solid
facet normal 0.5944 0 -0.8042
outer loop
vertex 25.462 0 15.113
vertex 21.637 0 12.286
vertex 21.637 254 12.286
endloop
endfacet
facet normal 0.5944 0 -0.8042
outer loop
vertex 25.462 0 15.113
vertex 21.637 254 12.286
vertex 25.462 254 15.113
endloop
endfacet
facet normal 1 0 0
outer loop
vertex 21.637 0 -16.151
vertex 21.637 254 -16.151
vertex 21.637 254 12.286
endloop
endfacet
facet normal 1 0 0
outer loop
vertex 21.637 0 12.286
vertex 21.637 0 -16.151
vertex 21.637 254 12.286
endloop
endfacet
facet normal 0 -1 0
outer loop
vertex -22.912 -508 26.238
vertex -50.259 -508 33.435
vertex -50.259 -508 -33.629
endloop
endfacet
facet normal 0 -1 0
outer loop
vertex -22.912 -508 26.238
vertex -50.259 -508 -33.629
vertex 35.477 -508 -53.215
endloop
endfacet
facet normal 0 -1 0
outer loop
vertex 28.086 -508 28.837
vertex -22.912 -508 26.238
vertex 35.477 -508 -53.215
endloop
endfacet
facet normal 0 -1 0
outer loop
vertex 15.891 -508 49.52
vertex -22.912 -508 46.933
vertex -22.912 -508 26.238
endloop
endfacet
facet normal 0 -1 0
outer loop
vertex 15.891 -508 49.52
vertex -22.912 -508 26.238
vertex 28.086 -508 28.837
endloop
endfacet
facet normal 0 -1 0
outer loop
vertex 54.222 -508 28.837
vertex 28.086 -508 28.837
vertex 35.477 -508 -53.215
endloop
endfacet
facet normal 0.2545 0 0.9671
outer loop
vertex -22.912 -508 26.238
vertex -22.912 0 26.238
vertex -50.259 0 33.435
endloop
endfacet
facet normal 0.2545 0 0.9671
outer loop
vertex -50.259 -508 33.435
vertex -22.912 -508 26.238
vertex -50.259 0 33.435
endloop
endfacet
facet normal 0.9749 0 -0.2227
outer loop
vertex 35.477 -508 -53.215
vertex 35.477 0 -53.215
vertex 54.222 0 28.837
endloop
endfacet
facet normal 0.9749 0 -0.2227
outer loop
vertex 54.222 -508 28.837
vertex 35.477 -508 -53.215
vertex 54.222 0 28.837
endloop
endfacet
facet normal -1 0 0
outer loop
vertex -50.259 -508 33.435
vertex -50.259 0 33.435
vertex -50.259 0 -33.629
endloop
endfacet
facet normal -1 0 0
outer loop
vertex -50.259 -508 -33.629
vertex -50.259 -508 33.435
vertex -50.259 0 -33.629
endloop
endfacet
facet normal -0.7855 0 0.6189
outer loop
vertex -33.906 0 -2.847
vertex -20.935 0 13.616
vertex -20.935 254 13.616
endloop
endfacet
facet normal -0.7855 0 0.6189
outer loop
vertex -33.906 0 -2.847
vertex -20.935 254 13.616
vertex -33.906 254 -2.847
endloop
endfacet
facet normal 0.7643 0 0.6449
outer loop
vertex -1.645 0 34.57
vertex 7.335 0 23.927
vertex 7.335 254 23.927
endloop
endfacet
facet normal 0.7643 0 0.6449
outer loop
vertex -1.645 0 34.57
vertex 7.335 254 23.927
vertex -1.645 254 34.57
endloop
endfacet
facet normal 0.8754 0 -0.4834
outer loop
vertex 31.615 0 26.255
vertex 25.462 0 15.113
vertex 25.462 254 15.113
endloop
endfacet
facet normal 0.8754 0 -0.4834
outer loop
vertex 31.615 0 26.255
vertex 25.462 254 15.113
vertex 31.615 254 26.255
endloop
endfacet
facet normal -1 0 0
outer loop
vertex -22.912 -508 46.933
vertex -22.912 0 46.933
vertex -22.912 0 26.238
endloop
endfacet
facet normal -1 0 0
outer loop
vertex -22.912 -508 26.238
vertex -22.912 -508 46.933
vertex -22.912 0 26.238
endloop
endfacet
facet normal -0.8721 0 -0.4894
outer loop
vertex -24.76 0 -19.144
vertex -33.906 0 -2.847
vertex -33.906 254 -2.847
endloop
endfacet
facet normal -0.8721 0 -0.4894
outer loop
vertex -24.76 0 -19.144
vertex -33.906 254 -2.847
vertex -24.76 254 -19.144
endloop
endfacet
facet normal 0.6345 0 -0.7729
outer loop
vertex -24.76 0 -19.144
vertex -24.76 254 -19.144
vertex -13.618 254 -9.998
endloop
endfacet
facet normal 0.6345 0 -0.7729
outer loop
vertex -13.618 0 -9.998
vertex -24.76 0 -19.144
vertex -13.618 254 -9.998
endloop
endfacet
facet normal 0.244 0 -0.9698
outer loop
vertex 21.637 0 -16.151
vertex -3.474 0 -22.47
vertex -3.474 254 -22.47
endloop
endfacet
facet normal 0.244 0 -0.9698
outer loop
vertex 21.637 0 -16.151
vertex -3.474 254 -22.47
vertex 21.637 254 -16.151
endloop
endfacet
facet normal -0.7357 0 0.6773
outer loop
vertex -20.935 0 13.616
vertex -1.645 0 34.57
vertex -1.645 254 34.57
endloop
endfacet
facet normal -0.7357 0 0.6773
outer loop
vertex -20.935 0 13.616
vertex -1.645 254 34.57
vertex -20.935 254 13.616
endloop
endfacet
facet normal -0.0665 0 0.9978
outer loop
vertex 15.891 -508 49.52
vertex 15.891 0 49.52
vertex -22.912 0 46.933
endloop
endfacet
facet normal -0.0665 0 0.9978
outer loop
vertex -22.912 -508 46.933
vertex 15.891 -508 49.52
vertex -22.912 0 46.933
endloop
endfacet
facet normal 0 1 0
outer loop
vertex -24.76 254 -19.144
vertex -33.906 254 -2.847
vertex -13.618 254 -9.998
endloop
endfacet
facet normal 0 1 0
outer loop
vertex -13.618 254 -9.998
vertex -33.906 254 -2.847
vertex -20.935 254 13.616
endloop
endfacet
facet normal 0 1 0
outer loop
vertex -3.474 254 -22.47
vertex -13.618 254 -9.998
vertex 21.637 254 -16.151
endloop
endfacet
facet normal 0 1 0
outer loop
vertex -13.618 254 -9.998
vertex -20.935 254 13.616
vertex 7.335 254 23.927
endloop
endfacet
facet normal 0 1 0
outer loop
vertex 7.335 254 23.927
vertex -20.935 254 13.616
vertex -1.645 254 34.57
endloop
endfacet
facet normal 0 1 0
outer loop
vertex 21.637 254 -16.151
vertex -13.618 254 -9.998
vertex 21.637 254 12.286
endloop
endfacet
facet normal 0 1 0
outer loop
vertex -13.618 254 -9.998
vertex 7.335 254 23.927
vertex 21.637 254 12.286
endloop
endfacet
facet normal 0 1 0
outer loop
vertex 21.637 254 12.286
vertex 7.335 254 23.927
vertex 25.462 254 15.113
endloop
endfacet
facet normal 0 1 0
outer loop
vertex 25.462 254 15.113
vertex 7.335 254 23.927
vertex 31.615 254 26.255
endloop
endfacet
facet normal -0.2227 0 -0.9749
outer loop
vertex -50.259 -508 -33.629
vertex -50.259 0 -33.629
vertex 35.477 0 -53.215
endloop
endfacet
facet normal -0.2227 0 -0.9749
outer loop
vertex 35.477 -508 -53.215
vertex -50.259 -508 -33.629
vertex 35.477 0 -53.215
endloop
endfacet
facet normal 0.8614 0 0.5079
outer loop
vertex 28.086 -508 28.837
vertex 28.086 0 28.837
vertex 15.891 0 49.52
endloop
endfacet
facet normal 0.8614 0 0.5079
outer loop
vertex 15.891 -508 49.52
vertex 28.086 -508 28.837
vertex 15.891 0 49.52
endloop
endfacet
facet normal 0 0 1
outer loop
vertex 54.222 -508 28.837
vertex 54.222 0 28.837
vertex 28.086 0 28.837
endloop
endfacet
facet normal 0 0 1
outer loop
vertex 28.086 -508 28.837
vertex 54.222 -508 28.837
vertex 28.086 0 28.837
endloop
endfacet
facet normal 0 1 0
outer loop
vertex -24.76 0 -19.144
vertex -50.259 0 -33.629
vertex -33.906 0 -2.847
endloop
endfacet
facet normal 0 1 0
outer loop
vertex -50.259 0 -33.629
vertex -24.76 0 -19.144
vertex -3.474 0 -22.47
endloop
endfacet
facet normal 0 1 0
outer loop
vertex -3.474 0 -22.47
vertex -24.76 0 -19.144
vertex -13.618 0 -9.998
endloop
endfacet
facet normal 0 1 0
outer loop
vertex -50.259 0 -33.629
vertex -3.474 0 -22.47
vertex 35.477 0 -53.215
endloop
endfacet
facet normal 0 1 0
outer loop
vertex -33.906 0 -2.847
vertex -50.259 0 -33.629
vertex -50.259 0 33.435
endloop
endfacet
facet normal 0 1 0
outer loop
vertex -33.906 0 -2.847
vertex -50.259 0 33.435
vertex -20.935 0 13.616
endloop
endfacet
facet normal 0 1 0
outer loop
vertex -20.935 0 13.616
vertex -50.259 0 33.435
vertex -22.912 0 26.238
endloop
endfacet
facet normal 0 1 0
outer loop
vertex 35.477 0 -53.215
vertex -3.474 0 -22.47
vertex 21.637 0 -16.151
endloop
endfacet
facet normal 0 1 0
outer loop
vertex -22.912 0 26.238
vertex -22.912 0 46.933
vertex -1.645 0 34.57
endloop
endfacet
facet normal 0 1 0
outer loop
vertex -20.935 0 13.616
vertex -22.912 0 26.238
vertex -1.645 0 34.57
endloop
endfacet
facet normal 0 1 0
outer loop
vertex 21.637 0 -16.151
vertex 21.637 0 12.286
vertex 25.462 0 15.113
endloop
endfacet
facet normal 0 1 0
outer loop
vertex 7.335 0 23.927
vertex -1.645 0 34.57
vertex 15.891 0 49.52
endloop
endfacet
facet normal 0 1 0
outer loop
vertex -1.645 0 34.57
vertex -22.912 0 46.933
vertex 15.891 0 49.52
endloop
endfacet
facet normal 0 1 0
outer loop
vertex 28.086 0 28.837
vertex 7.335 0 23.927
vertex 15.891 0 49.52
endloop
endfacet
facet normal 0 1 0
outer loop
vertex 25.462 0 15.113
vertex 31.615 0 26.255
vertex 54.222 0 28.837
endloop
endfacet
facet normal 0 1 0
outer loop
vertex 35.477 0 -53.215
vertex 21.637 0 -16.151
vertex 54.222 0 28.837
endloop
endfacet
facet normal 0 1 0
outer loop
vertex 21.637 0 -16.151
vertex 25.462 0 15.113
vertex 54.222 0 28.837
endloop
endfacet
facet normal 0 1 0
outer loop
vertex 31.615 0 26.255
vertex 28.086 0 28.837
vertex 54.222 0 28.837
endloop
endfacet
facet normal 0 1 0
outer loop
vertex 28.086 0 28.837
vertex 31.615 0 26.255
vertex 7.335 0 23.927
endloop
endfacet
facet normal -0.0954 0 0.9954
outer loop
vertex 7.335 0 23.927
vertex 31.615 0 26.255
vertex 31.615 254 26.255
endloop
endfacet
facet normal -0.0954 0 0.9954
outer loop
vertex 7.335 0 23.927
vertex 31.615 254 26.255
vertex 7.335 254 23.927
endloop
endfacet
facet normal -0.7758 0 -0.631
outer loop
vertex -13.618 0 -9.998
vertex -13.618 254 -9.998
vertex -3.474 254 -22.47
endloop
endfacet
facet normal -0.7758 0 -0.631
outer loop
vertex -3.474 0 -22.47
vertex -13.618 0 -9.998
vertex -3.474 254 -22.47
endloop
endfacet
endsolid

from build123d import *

# Parameters (mm, degrees)
F1_DEPTH = 508
F3_DEPTH = 254
F5_DEPTH = 254


with BuildPart() as f1:
    # F0 (on Front) → F1 (new body)
    with BuildSketch(Plane.XZ):
        Polygon((-22.912122, 26.238084), (-50.258853, 33.43459), (-50.258853, -33.629075), (35.476834, -53.215235), (54.221553, 28.837158), (28.085828, 28.837158), (15.890658, 49.519747), (-22.912122, 46.932891), align=None)
    extrude(amount=F1_DEPTH)

    # F2 (on face) → F3 (join)
    with BuildSketch(Plane(origin=(0, 0, 0), x_dir=(-1, 0, 0), z_dir=(0, 1, 0))):
        Polygon((28.587002, 10.809334), (-5.875511, 11.1418), (-6.94721, 10.140639), (-24.068851, 12.258933), (-25.929179, -8.414216), (0, -22.702822), (16.708504, -22.702822), (31.25754, -10.755406), align=None)
    extrude(amount=-F3_DEPTH)

    # F4 (on Front) → F5 (join)
    with BuildSketch(Plane.XZ):
        Polygon((21.636747, -16.150855), (21.636747, 12.28594), (25.461577, 15.112989), (31.614564, 26.254892), (7.335201, 23.926727), (-1.644839, 34.56974), (-20.935295, 13.616316), (-33.906464, -2.84709), (-24.760127, -19.1442), (-13.618225, -9.997867), (-3.474105, -22.470139), align=None)
    extrude(amount=-F5_DEPTH)


solid = f1.part
